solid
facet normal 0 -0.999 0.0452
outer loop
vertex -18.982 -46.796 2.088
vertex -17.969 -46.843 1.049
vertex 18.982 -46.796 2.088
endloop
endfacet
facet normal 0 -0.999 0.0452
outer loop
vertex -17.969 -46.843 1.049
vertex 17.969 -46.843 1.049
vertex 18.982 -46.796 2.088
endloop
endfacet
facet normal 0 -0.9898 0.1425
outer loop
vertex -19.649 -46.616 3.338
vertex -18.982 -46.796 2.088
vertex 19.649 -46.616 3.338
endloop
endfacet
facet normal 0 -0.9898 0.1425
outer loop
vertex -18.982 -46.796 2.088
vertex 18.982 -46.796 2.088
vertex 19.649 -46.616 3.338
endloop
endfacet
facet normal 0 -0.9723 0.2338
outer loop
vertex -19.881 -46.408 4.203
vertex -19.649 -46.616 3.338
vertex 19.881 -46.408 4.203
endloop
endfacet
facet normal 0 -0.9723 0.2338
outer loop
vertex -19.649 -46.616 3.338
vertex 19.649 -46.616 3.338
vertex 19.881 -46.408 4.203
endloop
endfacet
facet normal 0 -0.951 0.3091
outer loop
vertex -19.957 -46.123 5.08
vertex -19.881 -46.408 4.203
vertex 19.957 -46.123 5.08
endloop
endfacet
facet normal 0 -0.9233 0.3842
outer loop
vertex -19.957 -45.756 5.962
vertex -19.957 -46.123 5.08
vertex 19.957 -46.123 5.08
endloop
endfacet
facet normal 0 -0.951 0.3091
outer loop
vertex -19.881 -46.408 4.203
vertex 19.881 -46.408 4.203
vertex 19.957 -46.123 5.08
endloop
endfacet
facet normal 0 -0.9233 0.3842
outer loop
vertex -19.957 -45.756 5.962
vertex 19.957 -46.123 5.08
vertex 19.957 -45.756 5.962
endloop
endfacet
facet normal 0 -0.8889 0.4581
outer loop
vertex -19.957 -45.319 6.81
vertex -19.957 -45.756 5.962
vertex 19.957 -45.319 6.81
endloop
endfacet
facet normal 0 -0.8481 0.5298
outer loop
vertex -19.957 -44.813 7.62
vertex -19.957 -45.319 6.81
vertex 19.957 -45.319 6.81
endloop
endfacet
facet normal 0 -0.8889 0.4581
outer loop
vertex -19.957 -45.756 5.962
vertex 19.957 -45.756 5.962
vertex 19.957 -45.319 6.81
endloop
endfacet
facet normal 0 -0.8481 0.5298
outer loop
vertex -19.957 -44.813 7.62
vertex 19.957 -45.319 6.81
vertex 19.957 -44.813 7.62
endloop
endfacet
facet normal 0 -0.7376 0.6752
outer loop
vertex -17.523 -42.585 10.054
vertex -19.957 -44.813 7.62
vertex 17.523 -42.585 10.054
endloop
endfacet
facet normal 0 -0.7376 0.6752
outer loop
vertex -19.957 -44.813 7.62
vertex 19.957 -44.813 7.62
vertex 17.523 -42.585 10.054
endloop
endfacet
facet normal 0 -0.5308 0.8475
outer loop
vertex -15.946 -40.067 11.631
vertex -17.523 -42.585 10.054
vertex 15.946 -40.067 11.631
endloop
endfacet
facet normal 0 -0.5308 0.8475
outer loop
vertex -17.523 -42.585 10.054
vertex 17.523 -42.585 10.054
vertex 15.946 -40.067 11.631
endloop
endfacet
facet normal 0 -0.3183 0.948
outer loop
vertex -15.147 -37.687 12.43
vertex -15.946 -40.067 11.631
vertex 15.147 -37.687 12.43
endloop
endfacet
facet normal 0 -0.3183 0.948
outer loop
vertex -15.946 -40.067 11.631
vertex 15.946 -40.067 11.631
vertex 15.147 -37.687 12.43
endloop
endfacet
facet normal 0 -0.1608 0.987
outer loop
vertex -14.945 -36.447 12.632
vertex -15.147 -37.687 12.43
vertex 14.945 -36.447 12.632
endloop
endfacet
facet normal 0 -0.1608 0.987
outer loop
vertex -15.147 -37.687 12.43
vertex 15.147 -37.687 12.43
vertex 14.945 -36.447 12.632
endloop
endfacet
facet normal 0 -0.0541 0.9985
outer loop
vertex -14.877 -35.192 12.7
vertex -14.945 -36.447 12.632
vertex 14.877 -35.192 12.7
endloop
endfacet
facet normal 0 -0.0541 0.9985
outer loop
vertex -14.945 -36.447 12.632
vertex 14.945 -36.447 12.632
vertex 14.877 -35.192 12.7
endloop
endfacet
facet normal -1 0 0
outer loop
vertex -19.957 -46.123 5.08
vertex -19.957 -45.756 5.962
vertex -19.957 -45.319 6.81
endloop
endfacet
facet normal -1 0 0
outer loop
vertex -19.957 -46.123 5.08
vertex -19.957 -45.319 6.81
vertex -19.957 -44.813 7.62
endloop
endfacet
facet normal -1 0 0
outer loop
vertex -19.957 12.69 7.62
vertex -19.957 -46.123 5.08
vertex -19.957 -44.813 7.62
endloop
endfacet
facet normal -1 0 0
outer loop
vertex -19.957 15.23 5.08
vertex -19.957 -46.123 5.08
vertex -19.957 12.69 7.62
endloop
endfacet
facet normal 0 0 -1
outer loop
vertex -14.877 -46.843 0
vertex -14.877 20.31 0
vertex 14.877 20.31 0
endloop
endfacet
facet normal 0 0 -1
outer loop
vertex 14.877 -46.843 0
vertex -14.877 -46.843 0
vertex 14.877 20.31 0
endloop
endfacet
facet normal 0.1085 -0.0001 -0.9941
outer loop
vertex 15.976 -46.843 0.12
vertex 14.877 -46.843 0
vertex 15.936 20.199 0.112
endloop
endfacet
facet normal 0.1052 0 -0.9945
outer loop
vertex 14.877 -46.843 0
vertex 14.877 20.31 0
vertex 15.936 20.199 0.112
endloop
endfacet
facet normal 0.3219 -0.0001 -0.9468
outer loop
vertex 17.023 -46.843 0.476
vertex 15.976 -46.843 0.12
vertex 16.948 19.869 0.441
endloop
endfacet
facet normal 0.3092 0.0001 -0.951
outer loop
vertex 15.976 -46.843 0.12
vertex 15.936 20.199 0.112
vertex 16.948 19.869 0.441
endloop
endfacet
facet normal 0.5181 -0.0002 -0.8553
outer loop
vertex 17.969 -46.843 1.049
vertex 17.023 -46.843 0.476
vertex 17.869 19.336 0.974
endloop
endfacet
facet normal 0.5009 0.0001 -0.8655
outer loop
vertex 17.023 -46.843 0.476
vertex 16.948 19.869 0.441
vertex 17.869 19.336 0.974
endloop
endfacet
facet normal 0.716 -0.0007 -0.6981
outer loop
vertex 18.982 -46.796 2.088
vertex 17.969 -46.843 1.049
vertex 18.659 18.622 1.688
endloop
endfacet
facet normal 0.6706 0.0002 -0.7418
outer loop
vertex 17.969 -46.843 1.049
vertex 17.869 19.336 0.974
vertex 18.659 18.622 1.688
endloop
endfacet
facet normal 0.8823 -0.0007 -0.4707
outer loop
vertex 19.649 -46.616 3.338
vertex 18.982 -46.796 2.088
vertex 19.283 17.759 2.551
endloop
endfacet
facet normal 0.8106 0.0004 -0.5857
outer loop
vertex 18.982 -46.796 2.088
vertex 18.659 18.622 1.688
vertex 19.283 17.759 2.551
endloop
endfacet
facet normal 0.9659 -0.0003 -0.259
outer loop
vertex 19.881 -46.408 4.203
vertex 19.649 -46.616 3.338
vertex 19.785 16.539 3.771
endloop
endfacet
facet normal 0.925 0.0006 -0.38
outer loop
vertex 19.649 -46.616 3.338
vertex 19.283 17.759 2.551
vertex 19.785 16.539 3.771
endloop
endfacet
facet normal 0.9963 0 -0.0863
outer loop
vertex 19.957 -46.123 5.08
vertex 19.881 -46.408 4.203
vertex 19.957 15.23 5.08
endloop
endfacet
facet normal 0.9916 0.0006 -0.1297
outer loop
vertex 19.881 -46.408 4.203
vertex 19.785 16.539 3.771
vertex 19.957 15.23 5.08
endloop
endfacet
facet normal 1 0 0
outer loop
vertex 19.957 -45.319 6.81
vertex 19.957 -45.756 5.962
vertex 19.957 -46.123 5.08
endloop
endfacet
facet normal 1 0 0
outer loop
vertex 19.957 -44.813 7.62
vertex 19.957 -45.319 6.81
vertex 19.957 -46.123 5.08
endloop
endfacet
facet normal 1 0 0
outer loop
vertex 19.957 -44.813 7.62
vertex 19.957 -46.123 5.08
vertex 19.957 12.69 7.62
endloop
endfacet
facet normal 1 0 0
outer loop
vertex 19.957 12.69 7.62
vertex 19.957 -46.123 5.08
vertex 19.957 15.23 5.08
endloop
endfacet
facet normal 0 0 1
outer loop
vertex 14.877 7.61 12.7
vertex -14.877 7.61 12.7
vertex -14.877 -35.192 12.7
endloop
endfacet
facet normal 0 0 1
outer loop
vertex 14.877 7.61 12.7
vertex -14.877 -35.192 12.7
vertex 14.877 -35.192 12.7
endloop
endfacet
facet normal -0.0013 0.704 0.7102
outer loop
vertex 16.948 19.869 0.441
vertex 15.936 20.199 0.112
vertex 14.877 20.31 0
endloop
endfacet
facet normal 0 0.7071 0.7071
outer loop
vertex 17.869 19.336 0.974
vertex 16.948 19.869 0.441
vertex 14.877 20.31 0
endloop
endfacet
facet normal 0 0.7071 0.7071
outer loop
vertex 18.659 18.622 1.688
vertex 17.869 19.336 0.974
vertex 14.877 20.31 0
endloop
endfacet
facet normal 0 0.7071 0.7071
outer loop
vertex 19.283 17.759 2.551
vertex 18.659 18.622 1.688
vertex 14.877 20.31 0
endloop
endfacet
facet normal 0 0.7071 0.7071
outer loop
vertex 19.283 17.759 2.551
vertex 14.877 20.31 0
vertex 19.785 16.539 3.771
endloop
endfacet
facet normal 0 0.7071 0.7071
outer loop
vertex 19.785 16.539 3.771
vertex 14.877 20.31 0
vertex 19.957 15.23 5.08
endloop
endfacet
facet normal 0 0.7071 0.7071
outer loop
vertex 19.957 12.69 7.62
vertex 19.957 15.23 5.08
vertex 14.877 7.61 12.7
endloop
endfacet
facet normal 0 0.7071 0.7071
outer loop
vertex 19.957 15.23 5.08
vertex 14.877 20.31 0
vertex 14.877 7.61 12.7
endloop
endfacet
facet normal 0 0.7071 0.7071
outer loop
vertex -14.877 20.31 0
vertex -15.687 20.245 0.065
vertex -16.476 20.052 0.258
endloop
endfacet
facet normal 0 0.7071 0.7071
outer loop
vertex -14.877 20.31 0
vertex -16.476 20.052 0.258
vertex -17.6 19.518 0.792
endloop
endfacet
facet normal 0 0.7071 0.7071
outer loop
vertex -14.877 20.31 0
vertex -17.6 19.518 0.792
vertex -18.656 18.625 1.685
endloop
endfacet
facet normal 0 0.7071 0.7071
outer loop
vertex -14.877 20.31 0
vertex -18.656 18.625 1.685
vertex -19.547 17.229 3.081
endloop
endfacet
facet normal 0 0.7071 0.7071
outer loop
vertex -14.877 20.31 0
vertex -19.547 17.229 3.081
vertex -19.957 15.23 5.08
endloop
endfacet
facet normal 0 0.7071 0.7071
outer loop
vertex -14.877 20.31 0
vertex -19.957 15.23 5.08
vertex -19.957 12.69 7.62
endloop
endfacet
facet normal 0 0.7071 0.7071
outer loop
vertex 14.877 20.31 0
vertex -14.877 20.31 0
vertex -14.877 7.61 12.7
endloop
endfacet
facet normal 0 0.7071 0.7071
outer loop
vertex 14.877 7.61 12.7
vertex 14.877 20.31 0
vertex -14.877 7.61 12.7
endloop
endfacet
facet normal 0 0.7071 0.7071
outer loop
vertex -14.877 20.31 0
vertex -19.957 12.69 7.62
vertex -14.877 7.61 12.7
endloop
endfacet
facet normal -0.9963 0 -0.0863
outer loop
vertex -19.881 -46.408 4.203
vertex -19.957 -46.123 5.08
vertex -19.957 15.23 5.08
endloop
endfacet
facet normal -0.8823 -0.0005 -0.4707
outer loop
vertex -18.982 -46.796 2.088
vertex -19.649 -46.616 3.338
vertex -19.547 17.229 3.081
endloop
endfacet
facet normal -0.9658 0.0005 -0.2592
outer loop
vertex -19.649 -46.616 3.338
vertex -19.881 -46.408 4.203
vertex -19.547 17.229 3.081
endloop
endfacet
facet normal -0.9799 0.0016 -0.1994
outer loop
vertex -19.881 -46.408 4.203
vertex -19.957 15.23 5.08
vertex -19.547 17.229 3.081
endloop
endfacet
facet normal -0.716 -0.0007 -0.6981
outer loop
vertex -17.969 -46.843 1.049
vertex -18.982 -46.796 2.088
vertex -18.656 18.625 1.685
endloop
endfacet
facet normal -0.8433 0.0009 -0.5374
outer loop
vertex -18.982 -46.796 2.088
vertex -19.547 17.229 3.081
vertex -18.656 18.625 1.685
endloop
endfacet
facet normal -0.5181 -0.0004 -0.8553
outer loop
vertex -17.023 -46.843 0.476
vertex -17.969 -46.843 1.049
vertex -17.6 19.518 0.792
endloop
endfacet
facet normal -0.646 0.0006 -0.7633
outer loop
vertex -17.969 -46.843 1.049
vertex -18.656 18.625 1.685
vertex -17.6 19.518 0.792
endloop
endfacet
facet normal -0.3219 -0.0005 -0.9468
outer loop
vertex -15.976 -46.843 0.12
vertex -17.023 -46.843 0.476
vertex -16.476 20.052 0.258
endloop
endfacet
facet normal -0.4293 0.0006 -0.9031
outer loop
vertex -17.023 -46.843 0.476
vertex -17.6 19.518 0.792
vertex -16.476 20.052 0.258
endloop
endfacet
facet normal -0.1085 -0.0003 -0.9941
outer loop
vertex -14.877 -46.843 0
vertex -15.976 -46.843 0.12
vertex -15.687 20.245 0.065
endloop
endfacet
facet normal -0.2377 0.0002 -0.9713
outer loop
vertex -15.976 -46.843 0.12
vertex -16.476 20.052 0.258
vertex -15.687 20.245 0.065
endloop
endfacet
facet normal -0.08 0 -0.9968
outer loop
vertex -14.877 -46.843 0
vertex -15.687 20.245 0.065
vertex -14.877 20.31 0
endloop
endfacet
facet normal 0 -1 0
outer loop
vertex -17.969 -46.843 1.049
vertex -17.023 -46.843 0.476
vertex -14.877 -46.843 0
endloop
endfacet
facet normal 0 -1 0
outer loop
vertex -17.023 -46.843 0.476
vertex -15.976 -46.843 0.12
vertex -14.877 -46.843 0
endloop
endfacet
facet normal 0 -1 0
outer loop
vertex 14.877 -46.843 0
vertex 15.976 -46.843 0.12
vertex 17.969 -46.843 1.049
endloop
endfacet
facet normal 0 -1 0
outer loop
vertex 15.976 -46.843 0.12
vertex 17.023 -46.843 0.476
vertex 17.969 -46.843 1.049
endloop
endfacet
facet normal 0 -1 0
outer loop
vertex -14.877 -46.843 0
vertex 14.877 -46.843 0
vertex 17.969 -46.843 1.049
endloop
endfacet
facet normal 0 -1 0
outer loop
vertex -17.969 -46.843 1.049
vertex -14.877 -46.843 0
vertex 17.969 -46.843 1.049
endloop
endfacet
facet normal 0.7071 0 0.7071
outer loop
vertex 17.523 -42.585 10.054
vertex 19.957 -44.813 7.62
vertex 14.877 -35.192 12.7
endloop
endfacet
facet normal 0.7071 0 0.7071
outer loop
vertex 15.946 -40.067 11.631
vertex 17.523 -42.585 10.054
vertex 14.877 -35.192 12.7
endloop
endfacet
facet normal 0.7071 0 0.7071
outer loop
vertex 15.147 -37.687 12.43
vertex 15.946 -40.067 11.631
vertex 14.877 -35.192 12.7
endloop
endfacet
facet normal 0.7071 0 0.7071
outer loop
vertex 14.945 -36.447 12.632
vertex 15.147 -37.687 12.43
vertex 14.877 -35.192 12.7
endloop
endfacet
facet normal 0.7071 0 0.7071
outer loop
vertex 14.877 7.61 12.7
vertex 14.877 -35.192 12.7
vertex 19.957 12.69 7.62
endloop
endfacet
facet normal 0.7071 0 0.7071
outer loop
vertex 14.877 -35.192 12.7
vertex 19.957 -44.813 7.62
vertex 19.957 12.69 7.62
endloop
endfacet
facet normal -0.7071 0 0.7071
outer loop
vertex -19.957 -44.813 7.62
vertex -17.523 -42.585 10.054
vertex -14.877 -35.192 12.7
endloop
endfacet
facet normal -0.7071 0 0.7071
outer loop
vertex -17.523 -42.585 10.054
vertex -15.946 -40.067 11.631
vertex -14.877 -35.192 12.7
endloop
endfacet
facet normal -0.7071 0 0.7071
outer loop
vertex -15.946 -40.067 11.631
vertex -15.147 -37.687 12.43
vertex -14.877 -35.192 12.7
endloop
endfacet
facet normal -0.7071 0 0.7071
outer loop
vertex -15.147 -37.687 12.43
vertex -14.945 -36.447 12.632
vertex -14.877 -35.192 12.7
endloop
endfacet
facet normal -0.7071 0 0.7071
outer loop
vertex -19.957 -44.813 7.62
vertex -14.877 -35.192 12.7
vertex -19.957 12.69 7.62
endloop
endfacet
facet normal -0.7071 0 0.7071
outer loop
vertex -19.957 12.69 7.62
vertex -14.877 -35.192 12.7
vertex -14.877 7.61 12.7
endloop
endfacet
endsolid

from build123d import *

# Parameters (mm, degrees)
F0_W        = 39.9140380323
F0_H        = 79.8528119922
F1_DEPTH    = 12.7
F2_T1_DEPTH = 170.555533821
F3_R        = 5.08
F4_SIZE     = 5.08
F5_R        = 11.650994652


# Not quite as in the source:
# - a fillet or chamfer that OpenCascade refuses, or shapes differently, is made with other operations: its cross-section is extruded or revolved along the edge and cut away or added


with BuildPart() as f1:
    # F0 (on Top) → F1 (new body)
    with BuildSketch(Plane.XY):
        with Locations((0, -6.916385144)):
            Rectangle(F0_W, F0_H)
    extrude(amount=F1_DEPTH)

    # F2: chamfer of 25.4 on 1 edges, made by hand

    # F2_s2 → F2_t1 (cut)
    with BuildSketch(Plane.YZ.offset(-85.2777669105)):
        Polygon((33.0100208521, -12.7), (7.6100208521, 12.7), (33.0100208521, 12.7), align=None)
    extrude(amount=F2_T1_DEPTH, mode=Mode.SUBTRACT)

    # F3
    f3_edges = [f1.edges().sort_by_distance(p)[0] for p in [
        (19.957019, -13.266385, 0),
        (-19.957019, -13.266385, 0),
    ]]
    fillet(f3_edges, radius=F3_R)

    # F4
    f4_edges = [f1.edges().sort_by_distance(p)[0] for p in [
        (-19.957019, -19.616385, 12.7),
        (19.957019, -19.616385, 12.7),
    ]]
    chamfer(f4_edges, length=F4_SIZE)

    # F5
    f5_edges = [f1.edges().sort_by_distance(p)[0] for p in [
        (0, -46.842791, 12.7),
    ]]
    fillet(f5_edges, radius=F5_R)


solid = f1.part
